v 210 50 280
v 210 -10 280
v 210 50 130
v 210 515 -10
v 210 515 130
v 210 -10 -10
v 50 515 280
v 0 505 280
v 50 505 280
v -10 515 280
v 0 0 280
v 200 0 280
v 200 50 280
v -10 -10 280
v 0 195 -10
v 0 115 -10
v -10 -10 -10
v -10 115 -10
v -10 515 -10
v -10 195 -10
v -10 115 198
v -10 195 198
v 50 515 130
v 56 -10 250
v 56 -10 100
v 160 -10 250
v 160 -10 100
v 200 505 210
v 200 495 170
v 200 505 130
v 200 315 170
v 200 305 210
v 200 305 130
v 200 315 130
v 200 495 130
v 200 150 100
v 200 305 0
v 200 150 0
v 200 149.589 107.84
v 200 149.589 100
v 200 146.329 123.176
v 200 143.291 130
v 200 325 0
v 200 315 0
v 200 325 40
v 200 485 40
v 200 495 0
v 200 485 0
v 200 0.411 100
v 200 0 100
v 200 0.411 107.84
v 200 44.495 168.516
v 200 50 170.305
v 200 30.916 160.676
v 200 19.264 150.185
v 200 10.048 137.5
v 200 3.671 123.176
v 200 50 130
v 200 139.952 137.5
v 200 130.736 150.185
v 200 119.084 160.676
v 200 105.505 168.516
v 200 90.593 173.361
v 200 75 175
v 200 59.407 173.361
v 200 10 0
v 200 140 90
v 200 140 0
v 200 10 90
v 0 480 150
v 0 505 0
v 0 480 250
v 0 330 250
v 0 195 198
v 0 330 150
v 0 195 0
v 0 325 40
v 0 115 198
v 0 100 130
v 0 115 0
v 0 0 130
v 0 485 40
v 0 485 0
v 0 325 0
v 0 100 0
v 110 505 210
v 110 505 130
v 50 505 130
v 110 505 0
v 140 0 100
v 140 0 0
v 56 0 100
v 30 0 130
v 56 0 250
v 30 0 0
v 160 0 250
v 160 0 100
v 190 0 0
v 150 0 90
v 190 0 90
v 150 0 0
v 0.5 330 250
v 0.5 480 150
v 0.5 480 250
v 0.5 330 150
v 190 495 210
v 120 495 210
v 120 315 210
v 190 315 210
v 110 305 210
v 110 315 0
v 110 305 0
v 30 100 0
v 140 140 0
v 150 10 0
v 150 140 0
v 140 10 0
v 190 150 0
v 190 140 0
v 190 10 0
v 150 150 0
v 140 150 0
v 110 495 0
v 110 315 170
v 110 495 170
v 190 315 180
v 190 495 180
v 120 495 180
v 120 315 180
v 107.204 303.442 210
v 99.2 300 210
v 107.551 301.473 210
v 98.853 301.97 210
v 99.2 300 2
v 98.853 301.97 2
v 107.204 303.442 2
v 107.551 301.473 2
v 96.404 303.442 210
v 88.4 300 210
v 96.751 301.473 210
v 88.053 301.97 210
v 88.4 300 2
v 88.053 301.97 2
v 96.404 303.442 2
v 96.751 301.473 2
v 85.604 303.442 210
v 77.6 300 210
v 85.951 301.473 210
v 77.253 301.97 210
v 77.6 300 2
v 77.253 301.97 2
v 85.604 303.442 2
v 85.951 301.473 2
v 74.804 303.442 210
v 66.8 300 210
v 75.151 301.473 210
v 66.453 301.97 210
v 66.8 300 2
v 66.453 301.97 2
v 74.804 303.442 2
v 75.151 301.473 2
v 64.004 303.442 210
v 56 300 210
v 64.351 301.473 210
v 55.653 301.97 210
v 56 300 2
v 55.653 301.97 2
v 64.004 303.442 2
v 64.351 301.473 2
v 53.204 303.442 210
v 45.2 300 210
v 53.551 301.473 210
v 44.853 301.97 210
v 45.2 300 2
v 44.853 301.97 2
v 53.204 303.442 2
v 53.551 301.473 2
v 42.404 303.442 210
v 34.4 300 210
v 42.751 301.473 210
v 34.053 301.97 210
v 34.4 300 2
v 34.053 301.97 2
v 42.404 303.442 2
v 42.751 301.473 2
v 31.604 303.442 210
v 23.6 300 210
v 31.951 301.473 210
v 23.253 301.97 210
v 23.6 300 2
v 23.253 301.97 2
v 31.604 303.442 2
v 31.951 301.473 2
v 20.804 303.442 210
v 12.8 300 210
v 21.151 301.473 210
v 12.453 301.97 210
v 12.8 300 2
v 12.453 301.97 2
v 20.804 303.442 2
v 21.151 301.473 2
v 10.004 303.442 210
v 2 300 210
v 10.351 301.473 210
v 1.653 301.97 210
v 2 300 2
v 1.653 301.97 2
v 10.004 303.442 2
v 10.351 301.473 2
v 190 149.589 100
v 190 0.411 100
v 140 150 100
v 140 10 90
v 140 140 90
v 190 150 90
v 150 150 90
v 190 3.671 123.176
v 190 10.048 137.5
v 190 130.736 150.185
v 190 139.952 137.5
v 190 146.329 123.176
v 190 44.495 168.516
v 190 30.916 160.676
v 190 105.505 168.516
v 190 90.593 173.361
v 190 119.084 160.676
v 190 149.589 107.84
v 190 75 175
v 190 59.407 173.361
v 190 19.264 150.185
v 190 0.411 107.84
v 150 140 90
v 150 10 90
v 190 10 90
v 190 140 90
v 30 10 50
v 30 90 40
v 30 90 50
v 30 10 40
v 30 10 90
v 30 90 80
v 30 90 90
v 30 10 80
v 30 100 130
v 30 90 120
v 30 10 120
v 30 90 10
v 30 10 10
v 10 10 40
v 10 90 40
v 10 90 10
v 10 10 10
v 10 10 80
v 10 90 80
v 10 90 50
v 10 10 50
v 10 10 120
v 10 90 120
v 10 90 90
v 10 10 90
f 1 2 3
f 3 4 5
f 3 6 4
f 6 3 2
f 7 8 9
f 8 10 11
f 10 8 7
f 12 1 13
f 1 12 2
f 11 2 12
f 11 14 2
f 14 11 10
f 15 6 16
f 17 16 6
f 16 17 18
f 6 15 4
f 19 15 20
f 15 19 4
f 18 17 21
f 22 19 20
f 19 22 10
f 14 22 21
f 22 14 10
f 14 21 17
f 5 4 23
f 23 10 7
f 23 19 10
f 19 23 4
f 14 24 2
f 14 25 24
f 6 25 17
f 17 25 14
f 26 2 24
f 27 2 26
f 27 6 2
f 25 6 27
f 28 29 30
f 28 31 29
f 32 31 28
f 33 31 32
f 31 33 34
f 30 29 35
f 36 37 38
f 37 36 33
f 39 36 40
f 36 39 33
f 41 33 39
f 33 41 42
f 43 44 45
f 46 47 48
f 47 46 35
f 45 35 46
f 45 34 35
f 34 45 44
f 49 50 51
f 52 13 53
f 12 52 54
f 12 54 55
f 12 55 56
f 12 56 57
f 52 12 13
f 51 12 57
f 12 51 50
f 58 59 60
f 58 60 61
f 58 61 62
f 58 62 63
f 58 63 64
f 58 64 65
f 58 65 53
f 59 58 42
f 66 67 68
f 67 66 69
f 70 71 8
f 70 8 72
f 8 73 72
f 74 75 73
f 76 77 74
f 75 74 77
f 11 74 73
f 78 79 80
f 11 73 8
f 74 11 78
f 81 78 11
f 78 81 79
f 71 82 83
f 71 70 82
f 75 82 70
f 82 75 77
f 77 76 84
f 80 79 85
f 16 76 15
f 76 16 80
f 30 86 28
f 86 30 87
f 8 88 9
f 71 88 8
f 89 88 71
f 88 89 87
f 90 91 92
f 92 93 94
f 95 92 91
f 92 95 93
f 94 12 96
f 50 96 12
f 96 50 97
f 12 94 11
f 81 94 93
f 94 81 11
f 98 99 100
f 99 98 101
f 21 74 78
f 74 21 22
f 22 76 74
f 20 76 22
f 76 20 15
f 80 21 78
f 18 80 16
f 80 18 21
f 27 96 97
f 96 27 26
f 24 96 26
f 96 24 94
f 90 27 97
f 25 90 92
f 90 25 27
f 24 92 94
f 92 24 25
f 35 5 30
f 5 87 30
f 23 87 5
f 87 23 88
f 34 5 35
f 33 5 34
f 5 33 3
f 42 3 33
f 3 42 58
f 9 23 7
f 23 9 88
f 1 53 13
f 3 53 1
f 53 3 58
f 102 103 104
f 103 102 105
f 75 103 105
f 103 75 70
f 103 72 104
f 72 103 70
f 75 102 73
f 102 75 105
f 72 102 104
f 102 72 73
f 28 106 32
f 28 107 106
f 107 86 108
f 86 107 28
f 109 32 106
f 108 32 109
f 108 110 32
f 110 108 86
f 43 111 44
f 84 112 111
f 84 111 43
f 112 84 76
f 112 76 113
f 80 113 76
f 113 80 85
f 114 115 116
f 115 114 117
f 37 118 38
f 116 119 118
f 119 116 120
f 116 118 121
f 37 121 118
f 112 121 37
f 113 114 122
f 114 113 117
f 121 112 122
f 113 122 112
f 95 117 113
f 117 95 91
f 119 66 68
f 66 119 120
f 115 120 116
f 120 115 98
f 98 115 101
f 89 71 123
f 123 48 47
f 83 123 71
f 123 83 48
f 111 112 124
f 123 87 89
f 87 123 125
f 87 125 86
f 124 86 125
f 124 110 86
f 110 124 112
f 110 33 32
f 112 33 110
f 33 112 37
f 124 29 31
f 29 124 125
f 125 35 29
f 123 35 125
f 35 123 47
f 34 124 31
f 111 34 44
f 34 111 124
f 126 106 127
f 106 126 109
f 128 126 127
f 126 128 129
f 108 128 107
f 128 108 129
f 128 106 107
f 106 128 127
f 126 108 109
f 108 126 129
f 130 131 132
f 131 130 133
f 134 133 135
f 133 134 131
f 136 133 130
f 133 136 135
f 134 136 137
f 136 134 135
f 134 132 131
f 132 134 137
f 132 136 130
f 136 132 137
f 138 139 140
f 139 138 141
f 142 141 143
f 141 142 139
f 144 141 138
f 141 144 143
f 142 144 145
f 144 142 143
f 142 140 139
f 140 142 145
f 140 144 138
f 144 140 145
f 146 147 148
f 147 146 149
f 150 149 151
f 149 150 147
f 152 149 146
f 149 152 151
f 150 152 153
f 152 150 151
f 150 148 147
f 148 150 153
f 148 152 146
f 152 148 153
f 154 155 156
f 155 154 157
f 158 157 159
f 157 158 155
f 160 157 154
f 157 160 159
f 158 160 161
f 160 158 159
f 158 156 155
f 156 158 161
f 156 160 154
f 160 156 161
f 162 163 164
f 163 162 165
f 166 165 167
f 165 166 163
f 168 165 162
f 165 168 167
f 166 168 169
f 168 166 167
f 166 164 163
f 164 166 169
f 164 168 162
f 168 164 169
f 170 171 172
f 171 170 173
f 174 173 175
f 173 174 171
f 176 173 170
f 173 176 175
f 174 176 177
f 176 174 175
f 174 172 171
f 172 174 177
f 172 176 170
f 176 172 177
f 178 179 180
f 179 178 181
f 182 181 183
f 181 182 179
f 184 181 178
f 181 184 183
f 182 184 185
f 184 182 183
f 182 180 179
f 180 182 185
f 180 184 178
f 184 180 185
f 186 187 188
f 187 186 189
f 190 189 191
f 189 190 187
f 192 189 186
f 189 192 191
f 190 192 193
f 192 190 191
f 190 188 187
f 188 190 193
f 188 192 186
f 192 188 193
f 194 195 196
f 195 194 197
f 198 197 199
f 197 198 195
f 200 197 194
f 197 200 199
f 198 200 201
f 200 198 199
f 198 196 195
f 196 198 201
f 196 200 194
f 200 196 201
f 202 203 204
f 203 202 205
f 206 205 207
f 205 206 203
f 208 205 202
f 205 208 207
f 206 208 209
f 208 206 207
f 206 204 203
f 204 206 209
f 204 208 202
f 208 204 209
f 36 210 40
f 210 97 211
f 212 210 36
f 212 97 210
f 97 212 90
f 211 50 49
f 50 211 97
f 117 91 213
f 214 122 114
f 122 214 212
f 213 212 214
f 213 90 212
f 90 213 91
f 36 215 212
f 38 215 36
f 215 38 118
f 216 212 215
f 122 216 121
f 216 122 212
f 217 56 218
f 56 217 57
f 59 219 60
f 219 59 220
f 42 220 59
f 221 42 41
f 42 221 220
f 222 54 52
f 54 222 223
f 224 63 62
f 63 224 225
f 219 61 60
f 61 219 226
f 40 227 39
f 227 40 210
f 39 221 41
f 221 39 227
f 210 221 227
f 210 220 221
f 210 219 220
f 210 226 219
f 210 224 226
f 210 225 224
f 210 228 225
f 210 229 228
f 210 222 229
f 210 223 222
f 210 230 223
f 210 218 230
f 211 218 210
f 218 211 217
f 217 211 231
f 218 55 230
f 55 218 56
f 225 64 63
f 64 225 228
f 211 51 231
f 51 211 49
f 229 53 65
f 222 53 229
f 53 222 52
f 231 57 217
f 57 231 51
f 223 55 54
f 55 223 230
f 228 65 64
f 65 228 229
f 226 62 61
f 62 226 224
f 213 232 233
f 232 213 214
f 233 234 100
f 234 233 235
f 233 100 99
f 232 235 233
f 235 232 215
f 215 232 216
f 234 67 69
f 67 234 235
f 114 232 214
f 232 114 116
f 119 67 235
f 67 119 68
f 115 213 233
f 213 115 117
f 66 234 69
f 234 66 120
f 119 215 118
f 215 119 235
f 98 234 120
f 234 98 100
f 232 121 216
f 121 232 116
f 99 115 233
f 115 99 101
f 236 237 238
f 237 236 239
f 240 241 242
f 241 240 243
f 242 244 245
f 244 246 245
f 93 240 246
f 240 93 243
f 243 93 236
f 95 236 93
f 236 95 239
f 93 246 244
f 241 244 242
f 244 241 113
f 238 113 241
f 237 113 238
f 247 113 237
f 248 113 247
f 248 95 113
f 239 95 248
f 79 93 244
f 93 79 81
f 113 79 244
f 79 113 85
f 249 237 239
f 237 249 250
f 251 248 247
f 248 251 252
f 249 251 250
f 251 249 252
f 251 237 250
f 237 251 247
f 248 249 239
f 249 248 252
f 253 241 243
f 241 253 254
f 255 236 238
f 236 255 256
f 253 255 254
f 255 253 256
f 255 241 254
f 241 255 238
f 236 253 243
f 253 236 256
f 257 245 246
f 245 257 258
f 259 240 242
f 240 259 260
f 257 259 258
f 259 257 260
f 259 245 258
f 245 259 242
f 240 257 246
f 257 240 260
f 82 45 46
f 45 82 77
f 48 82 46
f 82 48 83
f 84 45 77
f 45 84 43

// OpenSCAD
// unit size: 1 cm

room_width = 200;
room_length = 505;
room_height = 280;

door_width = 80;
door_offset = 115;
door_height = 198;

window_width = 200 - (40+56);
window_offset = 56;
window_bot = 100;
window_top = 30;

module room_floor()
{
    translate([0, 0, -10]) cube([room_width, room_length, 10]);
}

module room_walls()
{
    render(convexity = 3) difference()
    {
        translate([-10, -10, -10]) 
            cube([room_width+20, room_length+20, room_height+10]);
        
        translate([0, 0, -20]) 
            cube([room_width, room_length, room_height+30]);
        
        translate([-20, door_offset, -20]) 
            cube([30, door_width, door_height+20]);

        translate([window_offset, -20, window_bot]) 
            cube([window_width, 30, room_height-window_top-window_bot]);
    }
}

module room_walls_cut()
{
    module b1() {
        translate([-50, -50, -50])
            cube([room_width+100, room_length+100, 160]);
    }

    module b2() {
        difference() {
            translate([-50, -50, 110])
                cube([room_width+100, room_length+100, room_height-50]);
            b3();
        }
    }
    
    module b3() {
        translate([50, 50, 130])
            cube([room_width, room_length, room_height-50]);
    }

    color("#c764a2") render(convexity=2) intersection() {
        room_walls();
        b1();
    }

    color("#ffeeee") render(convexity=2) intersection() {
        room_walls();
        b2();
    }
    
    %render(convexity=2) intersection() {
        room_walls();
        b3();
    }    
}

bed_w = 200;
bed_l = 160;
bed_h = 40;

module bed()
{
    color([0.9, 0.9, 0.8])
        cube([bed_w, bed_l, bed_h]);
}

upper_w = 90;
upper_l = 200;
upper_h = 170;
upper_t = 40;

module curtain()
{
    for (i = [1:10])
        color([0.8, 0.8, 0.8, 0.4])
        translate([-(room_width-upper_w-2)*i*0.1, -5, 2])
        rotate([0, 0, 10])
        cube([(room_width-upper_w-4)*0.08, 2, upper_h+upper_t-2]);
}

module upper()
{
    color([0.8, 0.7, 0.6])
    difference()
    {
        cube([upper_w, upper_l, upper_h+upper_t]);

        translate([-10, 10, -10])
            cube([upper_w+20, upper_l-20, upper_h+10]);

        translate([10, 10, upper_h+10])
            cube([upper_w-20, upper_l-20, upper_t]);
    }
    curtain();
}

table_w = 60;
table_l = 150;
table_h = 100;

module table()
{
    color([0.8, 0.7, 0.6])
    render(convexity=3) difference()
    {
        union() {
            cube([table_w, table_l, table_h]);
            translate([table_w-10, table_l/2, table_h])
                rotate([0, 90, 0]) cylinder(10, d=table_l);
        }

        translate([-10, 10, -10])
            cube([table_w+20, table_l-20, table_h]);

        translate([10, -10, -10])
            cube([table_w-20, table_l+20, table_h]);
    }    
}

billy_w = 30;
billy_l = 100;
billy_h = 130;

module billy()
{
    color([0.8, 0.7, 0.6])
    render(convexity=3) difference()
    {
        cube([billy_w, billy_l, billy_h]);

        translate([10, 10, 10])
            cube([billy_w, billy_l-20, 30]);
        translate([10, 10, 50])
            cube([billy_w, billy_l-20, 30]);
        translate([10, 10, 90])
            cube([billy_w, billy_l-20, 30]);
    }    
}

flag_l = 150;
flag_h = 100;

module flag()
{
    color("#55CDFC") cube([1, flag_l, flag_h/5]);
    translate([0, 0, flag_h/5])
        color("#F7A8B8") cube([1, flag_l, flag_h/5]);    
    translate([0, 0, 2*flag_h/5])
        color("#FFFFFF") cube([1, flag_l, flag_h/5]);    
    translate([0, 0, 3*flag_h/5])
        color("#F7A8B8") cube([1, flag_l, flag_h/5]);    
    translate([0, 0, 4*flag_h/5])
        color("#55CDFC") cube([1, flag_l, flag_h/5]);    
}

room_floor();
room_walls_cut();

translate([-0.5, room_length-flag_l/2-upper_l/2, 150])
    flag();

translate([0, room_length-bed_l-20, 0])
    bed();

translate([room_width-upper_w, room_length-upper_l, 0])
    upper();

translate([room_width-table_w, 0, 0])
    table();

billy();
